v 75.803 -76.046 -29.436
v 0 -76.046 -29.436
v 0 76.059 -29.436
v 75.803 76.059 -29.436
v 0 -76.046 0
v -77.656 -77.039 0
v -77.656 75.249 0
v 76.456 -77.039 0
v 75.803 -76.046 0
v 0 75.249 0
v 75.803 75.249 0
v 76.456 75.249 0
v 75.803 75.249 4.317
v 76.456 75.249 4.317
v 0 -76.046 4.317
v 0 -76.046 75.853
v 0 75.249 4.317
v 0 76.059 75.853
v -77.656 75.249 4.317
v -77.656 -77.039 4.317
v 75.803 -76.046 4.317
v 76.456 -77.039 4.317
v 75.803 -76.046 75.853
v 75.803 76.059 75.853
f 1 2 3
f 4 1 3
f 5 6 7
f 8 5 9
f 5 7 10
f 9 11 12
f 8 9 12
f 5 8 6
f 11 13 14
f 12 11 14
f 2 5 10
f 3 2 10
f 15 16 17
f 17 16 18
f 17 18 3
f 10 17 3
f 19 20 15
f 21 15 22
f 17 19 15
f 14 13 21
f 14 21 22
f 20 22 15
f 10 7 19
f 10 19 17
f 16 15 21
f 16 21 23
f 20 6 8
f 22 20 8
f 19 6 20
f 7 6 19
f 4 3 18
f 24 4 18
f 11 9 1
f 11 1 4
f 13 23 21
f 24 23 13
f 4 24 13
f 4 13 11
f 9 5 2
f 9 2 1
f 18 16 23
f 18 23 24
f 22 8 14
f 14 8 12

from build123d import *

# Parameters (mm, degrees)
F0_W     = 154.1122123599
F0_H     = 152.2873193026
F1_DEPTH = 4.3168757111
F2_W     = 152.1053090692
F2_H     = 75.8531913161
F3_DEPTH = 25.4
F4_DEPTH = 105.2890252322
F5_DEPTH = 75.802506879


with BuildPart() as f1:
    # F0 (on Top) → F1 (new body)
    with BuildSketch(Plane.XY):
        with Locations((-0.5999542773, -0.8949711919)):
            Rectangle(F0_W, F0_H)
    extrude(amount=F1_DEPTH)

    # F2 (on Right) → F3 (join)
    with BuildSketch(Plane.YZ):
        with Locations((0.0062547624, 37.9265956581)):
            Rectangle(F2_W, F2_H)
    extrude(amount=F3_DEPTH)

    # F4 (add): a face of the model
    f4_faces = [f1.faces().sort_by_distance(p)[0] for p in [
        (12.7, 0.0062547624, 75.8531913161),
    ]]
    extrude(f4_faces, amount=-F4_DEPTH)

    # F5 (add): a face of the model
    f5_faces = [f1.faces().sort_by_distance(p)[0] for p in [
        (0, 0.0234783223, 24.1036447815),
    ]]
    extrude(f5_faces, amount=-F5_DEPTH)


solid = f1.part
